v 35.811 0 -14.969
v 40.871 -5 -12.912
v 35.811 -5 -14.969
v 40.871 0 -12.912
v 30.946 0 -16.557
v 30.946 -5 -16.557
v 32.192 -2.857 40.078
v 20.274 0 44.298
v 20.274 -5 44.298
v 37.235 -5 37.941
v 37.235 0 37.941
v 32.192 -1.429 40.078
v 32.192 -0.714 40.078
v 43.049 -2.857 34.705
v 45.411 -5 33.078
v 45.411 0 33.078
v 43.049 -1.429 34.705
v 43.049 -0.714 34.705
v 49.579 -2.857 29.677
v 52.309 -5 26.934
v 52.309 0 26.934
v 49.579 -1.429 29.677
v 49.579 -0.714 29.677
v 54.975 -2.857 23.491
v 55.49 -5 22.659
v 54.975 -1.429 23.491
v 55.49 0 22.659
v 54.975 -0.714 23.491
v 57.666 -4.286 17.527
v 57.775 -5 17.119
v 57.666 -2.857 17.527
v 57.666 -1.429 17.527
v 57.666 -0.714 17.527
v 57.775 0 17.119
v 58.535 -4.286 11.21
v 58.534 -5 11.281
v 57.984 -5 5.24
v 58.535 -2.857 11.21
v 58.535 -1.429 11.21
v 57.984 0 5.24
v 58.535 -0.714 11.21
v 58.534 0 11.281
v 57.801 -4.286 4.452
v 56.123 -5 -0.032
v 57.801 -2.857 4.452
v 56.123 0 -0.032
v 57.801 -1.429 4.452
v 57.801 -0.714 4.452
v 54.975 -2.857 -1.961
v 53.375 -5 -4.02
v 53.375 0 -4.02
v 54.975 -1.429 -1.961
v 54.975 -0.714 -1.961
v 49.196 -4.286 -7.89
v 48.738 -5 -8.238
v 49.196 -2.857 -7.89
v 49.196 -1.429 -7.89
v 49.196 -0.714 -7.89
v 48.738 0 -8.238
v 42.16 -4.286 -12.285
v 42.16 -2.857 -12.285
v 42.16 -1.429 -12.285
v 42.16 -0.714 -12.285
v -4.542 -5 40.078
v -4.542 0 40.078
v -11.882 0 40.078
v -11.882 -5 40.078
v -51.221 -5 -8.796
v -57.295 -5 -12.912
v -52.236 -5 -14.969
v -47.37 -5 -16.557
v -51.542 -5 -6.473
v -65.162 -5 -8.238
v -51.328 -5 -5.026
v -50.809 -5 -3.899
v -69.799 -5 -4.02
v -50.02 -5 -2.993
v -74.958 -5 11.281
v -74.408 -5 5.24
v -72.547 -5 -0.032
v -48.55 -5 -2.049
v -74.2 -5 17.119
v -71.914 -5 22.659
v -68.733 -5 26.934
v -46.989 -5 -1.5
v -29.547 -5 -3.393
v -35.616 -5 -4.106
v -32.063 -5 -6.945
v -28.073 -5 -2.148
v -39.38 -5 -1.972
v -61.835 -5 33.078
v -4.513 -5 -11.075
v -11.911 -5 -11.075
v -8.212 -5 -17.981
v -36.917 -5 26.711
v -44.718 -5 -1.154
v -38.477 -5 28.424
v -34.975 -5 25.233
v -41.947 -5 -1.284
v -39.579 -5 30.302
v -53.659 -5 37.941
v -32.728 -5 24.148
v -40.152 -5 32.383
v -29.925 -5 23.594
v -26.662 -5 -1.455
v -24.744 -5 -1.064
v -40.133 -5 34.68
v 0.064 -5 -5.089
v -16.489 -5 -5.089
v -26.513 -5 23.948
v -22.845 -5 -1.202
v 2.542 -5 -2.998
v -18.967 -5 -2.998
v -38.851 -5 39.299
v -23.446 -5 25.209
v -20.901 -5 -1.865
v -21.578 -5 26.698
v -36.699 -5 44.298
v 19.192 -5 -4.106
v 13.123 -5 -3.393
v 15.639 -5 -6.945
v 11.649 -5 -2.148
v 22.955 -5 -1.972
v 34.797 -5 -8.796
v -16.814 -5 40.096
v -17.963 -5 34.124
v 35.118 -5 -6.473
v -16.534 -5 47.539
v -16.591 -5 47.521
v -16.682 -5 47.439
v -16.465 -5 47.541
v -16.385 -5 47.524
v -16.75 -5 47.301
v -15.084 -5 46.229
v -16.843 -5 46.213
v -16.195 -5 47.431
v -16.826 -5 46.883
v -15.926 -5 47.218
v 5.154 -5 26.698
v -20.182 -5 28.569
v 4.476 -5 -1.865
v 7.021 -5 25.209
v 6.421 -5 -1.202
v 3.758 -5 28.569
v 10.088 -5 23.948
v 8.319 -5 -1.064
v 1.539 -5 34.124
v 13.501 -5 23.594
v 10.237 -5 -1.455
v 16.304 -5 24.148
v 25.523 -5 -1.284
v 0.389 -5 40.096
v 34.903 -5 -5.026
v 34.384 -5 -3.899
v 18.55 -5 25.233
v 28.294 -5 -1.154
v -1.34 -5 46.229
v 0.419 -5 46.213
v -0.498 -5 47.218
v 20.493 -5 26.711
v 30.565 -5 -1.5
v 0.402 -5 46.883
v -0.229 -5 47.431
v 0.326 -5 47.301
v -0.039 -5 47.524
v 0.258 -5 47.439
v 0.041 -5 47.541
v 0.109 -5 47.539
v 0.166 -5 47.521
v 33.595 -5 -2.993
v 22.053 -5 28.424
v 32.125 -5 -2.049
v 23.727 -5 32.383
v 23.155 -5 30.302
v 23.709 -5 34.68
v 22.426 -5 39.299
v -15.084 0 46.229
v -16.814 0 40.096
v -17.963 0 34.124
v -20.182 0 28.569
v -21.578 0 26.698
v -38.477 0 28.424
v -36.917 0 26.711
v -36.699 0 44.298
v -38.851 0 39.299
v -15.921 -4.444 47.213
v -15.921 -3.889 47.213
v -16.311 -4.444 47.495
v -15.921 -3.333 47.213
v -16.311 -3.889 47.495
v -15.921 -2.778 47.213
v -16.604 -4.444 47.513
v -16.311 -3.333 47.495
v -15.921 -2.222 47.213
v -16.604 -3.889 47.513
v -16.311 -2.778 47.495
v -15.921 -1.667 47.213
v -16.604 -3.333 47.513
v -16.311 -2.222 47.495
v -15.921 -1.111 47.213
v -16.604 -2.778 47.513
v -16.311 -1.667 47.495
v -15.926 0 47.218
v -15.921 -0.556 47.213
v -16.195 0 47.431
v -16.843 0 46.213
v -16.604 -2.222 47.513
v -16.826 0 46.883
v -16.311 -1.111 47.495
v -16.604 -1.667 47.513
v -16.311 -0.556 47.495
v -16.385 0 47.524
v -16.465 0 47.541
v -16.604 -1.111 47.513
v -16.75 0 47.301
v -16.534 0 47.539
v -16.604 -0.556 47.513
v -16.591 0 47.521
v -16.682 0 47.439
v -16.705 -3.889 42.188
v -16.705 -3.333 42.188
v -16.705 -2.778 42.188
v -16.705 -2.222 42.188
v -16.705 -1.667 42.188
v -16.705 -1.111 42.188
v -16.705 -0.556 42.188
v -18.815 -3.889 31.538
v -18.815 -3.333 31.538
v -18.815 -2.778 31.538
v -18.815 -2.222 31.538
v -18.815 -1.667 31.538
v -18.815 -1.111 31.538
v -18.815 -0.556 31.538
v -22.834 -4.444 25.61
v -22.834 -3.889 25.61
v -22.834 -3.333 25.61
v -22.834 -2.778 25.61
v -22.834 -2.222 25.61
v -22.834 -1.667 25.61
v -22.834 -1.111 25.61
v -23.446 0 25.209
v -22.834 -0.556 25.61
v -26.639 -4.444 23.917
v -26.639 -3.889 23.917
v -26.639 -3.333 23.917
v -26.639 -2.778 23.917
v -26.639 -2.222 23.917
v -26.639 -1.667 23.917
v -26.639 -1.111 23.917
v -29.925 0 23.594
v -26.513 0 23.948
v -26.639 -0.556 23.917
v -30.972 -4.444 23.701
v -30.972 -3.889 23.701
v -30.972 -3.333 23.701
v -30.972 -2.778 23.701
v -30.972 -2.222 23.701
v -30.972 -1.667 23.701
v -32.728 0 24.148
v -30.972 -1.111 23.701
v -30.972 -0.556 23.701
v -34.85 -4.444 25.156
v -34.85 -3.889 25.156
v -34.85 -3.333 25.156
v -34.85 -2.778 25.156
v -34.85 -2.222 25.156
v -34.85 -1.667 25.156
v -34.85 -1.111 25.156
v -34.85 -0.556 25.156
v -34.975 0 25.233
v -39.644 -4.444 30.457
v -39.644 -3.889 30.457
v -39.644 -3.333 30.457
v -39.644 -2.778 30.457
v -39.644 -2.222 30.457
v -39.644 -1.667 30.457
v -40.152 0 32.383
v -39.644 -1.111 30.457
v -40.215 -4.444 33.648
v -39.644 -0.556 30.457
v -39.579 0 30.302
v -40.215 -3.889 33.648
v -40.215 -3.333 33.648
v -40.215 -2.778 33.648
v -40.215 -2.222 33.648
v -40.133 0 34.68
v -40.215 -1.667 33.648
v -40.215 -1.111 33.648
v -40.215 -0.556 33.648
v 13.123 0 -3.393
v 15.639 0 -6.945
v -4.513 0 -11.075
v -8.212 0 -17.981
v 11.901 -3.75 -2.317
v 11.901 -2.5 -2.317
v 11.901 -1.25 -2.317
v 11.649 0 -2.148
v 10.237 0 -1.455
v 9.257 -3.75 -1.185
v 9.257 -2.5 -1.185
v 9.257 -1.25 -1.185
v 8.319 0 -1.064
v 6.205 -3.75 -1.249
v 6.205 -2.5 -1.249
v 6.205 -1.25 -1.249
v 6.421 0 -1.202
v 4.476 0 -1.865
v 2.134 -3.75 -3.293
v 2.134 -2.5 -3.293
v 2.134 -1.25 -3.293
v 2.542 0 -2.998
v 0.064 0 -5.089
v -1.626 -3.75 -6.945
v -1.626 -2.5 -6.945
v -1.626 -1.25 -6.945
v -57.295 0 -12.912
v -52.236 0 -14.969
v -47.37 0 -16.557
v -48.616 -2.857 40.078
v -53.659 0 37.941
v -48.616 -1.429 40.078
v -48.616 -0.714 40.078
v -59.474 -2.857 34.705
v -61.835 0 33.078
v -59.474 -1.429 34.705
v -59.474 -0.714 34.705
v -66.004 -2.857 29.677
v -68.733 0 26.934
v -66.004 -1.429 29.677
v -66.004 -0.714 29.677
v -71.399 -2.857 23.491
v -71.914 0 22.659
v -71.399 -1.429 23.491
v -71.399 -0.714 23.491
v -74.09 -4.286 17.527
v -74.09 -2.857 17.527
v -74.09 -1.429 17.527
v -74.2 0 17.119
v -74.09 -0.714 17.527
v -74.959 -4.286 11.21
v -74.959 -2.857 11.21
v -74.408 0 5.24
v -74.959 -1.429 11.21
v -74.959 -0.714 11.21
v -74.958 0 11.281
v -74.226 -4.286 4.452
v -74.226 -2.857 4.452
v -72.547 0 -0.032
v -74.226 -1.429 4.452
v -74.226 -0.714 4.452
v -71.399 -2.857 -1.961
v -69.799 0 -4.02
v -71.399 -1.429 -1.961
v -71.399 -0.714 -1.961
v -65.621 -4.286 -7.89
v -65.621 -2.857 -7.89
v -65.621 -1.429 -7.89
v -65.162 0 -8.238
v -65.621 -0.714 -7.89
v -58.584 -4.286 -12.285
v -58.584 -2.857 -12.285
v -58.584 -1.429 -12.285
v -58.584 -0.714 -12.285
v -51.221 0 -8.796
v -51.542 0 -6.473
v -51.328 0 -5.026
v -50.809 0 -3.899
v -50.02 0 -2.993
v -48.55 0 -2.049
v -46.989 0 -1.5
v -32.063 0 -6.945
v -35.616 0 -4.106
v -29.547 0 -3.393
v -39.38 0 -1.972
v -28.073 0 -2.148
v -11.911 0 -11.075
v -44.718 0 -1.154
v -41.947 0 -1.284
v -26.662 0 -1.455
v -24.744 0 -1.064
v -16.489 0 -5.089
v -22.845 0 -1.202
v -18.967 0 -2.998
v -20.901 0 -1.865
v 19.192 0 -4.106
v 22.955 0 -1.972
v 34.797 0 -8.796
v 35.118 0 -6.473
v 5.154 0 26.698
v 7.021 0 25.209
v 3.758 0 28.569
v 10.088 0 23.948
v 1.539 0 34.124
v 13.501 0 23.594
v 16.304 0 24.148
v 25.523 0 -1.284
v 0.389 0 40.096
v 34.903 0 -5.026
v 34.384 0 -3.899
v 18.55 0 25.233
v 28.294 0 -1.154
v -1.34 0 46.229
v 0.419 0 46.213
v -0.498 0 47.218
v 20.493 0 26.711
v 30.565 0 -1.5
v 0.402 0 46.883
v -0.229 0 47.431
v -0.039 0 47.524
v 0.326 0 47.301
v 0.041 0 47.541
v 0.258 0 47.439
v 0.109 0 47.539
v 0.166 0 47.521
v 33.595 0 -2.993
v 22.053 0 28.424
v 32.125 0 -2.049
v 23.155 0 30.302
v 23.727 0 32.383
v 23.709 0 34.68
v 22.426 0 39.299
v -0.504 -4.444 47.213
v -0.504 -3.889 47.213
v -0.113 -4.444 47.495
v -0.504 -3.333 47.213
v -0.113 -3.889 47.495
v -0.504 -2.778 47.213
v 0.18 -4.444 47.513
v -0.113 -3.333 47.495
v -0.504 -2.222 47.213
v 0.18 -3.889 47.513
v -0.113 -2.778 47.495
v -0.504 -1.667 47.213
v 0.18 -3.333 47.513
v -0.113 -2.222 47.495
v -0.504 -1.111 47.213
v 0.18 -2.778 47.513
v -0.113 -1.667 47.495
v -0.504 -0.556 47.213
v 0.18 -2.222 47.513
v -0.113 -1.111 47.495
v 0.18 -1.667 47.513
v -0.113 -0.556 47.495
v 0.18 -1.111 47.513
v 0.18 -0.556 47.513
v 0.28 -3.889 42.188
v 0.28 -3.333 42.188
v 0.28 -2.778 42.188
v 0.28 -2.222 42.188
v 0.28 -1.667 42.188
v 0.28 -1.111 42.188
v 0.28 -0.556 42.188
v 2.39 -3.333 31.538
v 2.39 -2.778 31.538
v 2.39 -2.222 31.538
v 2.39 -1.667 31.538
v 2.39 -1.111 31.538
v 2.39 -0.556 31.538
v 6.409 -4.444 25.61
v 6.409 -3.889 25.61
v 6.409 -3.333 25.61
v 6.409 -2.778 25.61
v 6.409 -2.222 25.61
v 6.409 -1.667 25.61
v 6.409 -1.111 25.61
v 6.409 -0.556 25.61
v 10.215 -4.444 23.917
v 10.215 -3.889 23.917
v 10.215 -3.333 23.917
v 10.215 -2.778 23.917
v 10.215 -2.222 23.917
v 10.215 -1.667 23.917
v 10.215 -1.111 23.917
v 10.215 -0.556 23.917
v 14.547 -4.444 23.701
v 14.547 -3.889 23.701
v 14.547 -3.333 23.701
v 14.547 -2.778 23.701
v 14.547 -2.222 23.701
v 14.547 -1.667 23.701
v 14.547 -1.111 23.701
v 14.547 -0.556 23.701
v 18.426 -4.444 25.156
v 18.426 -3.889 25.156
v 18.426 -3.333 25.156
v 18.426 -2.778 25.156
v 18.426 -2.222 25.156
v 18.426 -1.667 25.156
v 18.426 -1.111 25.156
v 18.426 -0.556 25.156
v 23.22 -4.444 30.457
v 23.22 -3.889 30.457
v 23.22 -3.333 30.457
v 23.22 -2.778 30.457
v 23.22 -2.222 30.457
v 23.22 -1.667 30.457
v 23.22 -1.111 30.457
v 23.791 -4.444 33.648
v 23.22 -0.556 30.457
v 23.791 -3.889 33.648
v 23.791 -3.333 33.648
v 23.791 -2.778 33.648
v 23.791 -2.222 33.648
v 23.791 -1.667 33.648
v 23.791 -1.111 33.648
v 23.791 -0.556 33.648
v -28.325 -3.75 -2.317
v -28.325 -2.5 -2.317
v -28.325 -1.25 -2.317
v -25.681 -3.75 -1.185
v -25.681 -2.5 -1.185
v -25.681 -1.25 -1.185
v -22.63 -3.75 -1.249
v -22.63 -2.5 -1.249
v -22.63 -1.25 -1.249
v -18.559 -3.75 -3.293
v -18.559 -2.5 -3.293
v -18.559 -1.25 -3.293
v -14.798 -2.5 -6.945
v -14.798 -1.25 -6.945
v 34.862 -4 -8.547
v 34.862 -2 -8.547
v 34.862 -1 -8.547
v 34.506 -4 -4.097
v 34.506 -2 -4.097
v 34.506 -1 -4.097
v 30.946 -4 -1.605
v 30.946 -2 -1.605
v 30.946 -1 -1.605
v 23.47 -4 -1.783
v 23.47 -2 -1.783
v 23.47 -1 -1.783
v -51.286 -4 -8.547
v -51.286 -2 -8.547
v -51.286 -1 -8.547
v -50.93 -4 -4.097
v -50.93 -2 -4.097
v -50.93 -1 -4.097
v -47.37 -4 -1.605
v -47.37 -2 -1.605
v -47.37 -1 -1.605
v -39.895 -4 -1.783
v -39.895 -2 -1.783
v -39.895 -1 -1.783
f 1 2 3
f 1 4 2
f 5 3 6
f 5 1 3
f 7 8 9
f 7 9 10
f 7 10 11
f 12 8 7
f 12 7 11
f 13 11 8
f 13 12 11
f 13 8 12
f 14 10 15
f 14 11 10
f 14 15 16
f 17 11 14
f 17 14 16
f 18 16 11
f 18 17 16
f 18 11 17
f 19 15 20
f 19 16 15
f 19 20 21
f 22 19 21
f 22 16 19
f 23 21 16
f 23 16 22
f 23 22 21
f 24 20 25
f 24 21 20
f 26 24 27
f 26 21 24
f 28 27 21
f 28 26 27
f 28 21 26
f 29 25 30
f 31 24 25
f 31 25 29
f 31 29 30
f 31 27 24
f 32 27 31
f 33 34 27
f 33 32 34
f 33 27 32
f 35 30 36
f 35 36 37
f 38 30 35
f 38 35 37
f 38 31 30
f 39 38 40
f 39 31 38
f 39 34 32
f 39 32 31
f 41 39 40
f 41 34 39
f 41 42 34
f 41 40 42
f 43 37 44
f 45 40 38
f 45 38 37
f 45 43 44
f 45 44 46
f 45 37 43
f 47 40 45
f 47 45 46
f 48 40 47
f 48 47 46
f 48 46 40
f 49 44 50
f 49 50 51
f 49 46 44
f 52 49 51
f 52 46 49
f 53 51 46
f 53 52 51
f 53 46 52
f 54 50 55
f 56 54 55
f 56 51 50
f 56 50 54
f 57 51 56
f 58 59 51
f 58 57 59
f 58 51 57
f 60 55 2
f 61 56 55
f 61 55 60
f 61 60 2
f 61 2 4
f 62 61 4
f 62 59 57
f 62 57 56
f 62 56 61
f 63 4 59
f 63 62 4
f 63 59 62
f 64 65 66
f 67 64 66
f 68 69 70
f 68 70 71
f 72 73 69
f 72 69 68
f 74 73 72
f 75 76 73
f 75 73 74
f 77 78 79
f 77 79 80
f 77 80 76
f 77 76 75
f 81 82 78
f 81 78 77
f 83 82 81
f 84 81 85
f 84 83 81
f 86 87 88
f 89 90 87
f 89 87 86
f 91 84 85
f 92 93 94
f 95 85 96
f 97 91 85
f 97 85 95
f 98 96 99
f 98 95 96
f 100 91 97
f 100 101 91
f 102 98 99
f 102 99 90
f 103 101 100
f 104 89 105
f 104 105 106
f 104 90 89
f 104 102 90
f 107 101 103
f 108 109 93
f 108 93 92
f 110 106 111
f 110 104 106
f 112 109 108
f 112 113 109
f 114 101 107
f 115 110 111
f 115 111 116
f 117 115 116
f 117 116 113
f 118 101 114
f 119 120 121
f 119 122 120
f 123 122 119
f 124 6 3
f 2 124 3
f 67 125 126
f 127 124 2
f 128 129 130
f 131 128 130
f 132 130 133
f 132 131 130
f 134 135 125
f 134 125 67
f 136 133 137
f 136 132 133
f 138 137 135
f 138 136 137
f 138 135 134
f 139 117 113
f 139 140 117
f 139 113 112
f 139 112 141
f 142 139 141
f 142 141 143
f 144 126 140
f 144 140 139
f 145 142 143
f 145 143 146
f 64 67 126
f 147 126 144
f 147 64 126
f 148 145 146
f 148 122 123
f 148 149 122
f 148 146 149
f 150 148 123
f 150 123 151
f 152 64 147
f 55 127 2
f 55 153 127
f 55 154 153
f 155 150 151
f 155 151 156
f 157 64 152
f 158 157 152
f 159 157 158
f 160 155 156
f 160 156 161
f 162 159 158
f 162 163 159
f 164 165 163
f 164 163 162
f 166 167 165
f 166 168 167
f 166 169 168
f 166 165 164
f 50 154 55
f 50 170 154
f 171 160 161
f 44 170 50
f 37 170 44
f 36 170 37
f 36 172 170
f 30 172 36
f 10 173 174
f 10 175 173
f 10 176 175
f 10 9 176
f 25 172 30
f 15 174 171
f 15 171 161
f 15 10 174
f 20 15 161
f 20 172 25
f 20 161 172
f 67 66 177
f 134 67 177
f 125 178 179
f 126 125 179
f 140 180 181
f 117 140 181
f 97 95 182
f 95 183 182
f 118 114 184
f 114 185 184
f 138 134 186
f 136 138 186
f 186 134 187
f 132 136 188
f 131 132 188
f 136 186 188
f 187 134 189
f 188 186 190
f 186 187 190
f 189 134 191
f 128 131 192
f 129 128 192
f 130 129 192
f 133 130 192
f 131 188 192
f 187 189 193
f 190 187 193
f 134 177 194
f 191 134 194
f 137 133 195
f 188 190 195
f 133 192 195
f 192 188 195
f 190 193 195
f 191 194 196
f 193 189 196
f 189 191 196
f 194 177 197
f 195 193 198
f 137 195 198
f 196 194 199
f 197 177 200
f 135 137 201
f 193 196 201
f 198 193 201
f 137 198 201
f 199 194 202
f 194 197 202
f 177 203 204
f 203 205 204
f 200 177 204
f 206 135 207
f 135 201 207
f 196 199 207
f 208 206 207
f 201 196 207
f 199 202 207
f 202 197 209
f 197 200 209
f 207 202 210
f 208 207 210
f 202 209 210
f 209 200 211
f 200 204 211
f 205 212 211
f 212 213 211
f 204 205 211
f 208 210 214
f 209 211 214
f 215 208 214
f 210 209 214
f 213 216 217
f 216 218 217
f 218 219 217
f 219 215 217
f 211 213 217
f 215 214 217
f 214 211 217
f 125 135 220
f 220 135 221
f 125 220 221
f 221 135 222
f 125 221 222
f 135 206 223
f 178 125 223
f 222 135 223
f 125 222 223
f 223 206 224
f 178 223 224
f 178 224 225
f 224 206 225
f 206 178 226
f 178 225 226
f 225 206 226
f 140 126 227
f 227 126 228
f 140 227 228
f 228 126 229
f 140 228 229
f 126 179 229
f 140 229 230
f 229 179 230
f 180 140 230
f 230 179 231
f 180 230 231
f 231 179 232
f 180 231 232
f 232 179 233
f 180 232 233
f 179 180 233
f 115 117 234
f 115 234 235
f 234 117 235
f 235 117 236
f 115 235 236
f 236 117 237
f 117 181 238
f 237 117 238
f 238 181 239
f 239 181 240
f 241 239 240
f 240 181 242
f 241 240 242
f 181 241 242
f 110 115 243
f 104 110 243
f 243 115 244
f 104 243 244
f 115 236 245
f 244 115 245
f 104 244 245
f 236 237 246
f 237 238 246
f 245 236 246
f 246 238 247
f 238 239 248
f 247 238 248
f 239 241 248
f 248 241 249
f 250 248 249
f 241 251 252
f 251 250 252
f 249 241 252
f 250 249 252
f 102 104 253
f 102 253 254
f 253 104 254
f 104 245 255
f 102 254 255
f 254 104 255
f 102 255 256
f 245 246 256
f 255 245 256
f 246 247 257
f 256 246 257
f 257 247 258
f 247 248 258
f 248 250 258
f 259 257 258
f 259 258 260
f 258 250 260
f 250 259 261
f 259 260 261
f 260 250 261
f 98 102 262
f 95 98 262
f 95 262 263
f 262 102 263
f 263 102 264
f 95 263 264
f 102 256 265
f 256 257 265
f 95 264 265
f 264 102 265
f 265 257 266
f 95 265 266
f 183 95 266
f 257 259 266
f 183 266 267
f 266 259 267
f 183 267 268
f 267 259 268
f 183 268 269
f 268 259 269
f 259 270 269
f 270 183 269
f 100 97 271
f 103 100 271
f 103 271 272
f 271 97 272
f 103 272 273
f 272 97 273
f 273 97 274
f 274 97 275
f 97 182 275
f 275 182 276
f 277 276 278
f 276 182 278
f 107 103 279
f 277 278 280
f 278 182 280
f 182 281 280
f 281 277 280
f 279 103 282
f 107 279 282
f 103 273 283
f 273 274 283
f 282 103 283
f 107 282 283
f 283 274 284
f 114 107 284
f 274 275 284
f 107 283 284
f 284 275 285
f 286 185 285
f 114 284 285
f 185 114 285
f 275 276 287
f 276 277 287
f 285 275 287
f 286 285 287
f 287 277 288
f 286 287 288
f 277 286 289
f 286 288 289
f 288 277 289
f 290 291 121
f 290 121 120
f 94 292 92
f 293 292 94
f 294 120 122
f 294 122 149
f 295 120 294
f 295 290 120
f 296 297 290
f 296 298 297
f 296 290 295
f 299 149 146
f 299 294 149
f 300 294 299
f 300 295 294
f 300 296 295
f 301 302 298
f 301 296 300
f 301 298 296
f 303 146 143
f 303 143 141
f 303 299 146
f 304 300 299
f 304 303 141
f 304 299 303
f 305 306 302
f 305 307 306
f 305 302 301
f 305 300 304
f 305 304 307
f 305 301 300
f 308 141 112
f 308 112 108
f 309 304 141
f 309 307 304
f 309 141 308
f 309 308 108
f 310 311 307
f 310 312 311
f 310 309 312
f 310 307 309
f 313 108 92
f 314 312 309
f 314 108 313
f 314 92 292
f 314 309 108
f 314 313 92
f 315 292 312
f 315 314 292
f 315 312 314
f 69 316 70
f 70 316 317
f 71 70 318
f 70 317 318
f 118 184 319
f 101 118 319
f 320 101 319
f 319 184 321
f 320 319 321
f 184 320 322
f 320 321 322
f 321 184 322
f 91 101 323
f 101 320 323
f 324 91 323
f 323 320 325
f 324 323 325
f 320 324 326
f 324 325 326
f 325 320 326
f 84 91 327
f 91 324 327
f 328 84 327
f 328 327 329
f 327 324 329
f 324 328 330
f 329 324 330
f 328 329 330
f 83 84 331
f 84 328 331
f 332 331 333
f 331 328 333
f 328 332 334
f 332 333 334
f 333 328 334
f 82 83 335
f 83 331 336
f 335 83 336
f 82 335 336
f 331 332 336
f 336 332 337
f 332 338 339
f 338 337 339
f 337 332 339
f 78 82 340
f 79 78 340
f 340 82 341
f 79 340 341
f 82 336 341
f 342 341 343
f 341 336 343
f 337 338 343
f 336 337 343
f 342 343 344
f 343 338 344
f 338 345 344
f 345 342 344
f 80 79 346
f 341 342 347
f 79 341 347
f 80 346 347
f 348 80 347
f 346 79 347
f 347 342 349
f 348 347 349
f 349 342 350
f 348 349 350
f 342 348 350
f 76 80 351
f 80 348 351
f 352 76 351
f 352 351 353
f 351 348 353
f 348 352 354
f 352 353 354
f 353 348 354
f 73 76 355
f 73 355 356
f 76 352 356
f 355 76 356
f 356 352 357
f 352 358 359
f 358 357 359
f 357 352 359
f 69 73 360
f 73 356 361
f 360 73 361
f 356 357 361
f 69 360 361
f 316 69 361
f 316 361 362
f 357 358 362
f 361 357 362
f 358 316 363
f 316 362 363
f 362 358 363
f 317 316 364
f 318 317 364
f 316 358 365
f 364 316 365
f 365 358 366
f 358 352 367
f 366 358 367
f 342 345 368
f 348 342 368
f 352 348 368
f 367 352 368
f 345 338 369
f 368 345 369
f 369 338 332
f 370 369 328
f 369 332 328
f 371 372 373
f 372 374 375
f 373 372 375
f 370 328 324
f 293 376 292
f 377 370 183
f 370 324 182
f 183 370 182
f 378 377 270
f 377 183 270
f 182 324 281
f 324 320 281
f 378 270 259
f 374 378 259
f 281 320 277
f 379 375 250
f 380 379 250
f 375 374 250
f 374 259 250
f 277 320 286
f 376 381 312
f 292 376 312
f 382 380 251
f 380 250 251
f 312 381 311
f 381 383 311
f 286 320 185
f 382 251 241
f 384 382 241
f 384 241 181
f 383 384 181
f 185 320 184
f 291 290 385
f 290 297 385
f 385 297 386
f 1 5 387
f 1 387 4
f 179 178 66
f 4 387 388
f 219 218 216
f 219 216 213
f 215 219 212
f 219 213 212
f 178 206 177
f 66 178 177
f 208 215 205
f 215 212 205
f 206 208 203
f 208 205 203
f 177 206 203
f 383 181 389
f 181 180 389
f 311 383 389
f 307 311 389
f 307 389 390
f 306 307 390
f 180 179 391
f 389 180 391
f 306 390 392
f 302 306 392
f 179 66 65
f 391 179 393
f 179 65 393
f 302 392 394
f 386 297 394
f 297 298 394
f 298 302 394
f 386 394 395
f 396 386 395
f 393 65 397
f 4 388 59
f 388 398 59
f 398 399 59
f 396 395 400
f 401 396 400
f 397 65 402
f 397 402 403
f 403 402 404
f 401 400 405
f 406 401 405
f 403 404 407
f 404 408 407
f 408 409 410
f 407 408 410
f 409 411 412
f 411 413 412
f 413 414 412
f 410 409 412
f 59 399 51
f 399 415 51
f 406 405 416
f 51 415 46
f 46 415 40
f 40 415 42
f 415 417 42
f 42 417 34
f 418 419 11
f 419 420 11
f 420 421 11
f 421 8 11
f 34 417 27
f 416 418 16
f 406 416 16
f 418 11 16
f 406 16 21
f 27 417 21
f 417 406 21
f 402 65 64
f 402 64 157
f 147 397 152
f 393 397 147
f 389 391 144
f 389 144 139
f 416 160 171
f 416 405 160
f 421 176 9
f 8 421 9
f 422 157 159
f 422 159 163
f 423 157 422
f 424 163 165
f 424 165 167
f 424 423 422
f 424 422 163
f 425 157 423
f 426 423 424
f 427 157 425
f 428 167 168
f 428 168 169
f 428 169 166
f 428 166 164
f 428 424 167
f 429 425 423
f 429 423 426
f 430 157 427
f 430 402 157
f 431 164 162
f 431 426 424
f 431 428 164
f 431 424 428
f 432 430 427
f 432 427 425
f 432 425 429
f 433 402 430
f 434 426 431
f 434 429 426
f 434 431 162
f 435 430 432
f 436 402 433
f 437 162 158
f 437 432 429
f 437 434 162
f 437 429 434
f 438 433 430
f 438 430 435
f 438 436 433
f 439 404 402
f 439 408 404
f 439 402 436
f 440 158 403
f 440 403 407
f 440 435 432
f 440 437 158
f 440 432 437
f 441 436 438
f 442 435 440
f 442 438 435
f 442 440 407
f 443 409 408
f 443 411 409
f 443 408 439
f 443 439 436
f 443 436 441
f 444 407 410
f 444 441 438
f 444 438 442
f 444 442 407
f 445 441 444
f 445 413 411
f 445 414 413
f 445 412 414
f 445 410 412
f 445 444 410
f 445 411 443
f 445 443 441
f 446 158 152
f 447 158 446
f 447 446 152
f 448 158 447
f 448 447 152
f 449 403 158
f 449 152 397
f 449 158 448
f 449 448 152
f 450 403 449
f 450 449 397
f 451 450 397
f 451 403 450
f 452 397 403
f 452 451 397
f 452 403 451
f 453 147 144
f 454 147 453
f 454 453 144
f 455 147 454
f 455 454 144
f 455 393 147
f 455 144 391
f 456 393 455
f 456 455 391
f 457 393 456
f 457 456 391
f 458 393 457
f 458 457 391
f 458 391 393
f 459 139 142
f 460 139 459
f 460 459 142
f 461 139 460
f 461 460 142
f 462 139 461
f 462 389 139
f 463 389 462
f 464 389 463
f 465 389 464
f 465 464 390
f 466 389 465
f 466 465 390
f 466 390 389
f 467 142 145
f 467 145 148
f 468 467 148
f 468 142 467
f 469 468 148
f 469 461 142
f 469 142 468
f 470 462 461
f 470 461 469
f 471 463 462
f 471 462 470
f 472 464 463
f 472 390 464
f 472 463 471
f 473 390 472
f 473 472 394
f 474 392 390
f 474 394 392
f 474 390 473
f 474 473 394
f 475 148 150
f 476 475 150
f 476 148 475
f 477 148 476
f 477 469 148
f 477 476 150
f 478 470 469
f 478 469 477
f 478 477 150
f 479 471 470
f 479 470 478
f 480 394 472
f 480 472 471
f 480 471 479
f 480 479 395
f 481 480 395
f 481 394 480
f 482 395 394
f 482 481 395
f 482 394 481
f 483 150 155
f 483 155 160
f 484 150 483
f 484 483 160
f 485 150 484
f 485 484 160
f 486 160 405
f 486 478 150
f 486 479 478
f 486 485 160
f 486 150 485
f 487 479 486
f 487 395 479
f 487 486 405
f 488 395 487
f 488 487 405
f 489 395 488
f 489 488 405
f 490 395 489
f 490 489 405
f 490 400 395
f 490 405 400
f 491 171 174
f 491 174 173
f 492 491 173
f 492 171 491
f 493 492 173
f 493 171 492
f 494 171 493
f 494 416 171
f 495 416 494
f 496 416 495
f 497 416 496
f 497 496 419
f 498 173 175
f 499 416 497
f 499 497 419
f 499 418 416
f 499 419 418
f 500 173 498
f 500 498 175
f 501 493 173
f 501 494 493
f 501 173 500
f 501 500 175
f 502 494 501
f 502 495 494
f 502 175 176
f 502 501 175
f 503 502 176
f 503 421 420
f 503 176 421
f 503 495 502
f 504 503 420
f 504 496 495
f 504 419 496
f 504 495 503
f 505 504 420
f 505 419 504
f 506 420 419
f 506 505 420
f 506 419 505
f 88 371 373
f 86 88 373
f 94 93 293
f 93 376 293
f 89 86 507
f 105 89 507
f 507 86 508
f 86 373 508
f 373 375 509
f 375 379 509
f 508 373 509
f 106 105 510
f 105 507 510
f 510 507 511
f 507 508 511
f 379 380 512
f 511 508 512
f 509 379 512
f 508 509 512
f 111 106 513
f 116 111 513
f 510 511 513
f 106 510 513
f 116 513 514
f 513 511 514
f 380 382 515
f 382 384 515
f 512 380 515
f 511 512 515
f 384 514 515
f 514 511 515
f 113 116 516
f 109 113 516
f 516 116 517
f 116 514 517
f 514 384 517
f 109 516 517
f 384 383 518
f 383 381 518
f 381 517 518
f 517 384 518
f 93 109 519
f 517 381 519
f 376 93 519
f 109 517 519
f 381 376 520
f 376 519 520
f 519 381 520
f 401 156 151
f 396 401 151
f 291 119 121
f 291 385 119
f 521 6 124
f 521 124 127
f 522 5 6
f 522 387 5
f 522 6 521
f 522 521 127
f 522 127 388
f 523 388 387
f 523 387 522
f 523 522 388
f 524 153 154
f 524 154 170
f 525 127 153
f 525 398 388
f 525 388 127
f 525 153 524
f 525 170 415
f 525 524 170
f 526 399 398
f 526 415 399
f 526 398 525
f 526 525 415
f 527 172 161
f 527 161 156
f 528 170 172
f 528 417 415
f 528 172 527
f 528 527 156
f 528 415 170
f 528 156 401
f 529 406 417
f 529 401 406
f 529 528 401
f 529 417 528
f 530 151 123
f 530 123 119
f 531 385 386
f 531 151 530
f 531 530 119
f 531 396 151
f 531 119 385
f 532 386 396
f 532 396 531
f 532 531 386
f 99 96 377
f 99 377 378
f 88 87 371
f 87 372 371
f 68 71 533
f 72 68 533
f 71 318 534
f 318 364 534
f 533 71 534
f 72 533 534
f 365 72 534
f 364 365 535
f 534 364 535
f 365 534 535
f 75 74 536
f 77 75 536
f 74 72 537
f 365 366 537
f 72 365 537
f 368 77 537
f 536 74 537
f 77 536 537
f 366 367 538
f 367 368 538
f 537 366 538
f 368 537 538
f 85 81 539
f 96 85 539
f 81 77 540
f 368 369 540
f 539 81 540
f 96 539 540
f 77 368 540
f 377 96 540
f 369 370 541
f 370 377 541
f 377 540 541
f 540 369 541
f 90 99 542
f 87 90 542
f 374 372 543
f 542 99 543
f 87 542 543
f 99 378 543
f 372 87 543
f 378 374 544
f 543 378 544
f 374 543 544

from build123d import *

# Parameters (mm, degrees)
F1_DEPTH = 5


with BuildPart() as f1:
    # F0 (on Front) → F1 (new body)
    with BuildSketch(Plane.XZ):
        with BuildLine():
            Line((-8.2122022286, 40.0784350932), (-11.8819409981, 40.0784350932))
            add(Edge.make_bspline(
                [(-11.8819409981, 40.0784350932), (-12.8782472371, 42.2972484802), (-14.4335544357, 45.7609791067), (-17.3519257227, 48.7913666131), (-16.0950854738, 41.2351091341), (-18.4014485043, 31.4854467346), (-22.0437905993, 24.85808478), (-31.2282103596, 22.4385748293), (-38.4247454255, 27.2876434832), (-41.4317275403, 33.8661623662), (-38.41791048, 40.5091837611), (-36.6988517344, 44.2983135581)],
                knots=[0, 0, 0, 0, 0.1088146702, 0.1698676905, 0.2662726076, 0.4039159487, 0.5157076846, 0.6364836069, 0.7547343235, 0.8601022896, 1, 1, 1, 1], degree=3))
            add(Edge.make_bspline(
                [(-36.6988517344, 44.2983135581), (-40.7675535004, 42.9207700785), (-48.8190673042, 40.1947628707), (-59.720474171, 35.363141512), (-72.7769239422, 24.2824619419), (-75.9139064544, 11.2929836241), (-73.1167440149, -3.1146307179), (-58.8360799137, -12.9740366543), (-50.9861442753, -15.4269461348), (-47.3704449832, -16.5567621589)],
                knots=[0, 0, 0, 0, 0.1374294184, 0.271957721, 0.4283369128, 0.5665488064, 0.709317309, 0.8661108513, 1, 1, 1, 1], degree=3))
            add(Edge.make_bspline(
                [(-47.3704449832, -16.5567621589), (-49.0258540698, -13.767318885), (-51.8526301052, -9.0040664284), (-51.5200005236, -3.7669274307), (-47.3638537079, -1.00085823), (-39.2892684136, -0.8731954731), (-34.5610362718, -4.8462458488), (-32.0631302893, -6.9451923482)],
                knots=[0, 0, 0, 0, 0.2300305605, 0.3928001127, 0.553391391, 0.764058472, 1, 1, 1, 1], degree=3))
            add(Edge.make_bspline(
                [(-32.0631302893, -6.9451923482), (-30.9825657831, -5.1874304781), (-28.8354937584, -1.6947733382), (-22.0931432409, -0.1443481526), (-13.8550388164, -6.7624223585), (-10.1796756768, -14.0692507531), (-8.2122022286, -17.9806984961)],
                knots=[0, 0, 0, 0, 0.2112971318, 0.419845514, 0.689435165, 1, 1, 1, 1], degree=3))
            add(Edge.make_bspline(
                [(15.6387258321, -6.9451923482), (14.5581613259, -5.1874304781), (12.4110893012, -1.6947733382), (5.6687387837, -0.1443481526), (-2.5693656408, -6.7624223585), (-6.2447287804, -14.0692507531), (-8.2122022286, -17.9806984961)],
                knots=[0, 0, 0, 0, 0.2112971318, 0.419845514, 0.689435165, 1, 1, 1, 1], degree=3))
            add(Edge.make_bspline(
                [(30.946040526, -16.5567621589), (32.6014496126, -13.767318885), (35.428225648, -9.0040664284), (35.0955960664, -3.7669274307), (30.9394492507, -1.00085823), (22.8648639564, -0.8731954731), (18.1366318146, -4.8462458488), (15.6387258321, -6.9451923482)],
                knots=[0, 0, 0, 0, 0.2300305605, 0.3928001127, 0.553391391, 0.764058472, 1, 1, 1, 1], degree=3))
            add(Edge.make_bspline(
                [(20.2744472772, 44.2983135581), (24.3431490432, 42.9207700785), (32.394662847, 40.1947628707), (43.2960697138, 35.363141512), (56.352519485, 24.2824619419), (59.4895019971, 11.2929836241), (56.6923395577, -3.1146307179), (42.4116754565, -12.9740366543), (34.5617398181, -15.4269461348), (30.946040526, -16.5567621589)],
                knots=[0, 0, 0, 0, 0.1374294184, 0.271957721, 0.4283369128, 0.5665488064, 0.709317309, 0.8661108513, 1, 1, 1, 1], degree=3))
            add(Edge.make_bspline(
                [(-4.5424634591, 40.0784350932), (-3.5461572201, 42.2972484802), (-1.9908500215, 45.7609791067), (0.9275212655, 48.7913666131), (-0.3293189834, 41.2351091341), (1.9770440471, 31.4854467346), (5.6193861421, 24.85808478), (14.8038059024, 22.4385748293), (22.0003409683, 27.2876434832), (25.0073230831, 33.8661623662), (21.9935060227, 40.5091837611), (20.2744472772, 44.2983135581)],
                knots=[0, 0, 0, 0, 0.1088146702, 0.1698676905, 0.2662726076, 0.4039159487, 0.5157076846, 0.6364836069, 0.7547343235, 0.8601022896, 1, 1, 1, 1], degree=3))
            Line((-4.5424634591, 40.0784350932), (-8.2122022286, 40.0784350932))
        make_face()
        with BuildLine():
            add(Edge.make_bspline(
                [(-40.7788082957, 40.8485867083), (-45.0160925485, 39.1557450069), (-53.0935510599, 35.9287114181), (-62.2941692207, 30.6878977022), (-71.2479782326, 20.5851416615), (-73.0395933906, 13.1368363398), (-70.655821628, 0.3918412405), (-65.9333309108, -4.7486149953), (-56.4205247664, -11.0687593178), (-52.9760592159, -12.4550883248), (-51.5802241862, -13.0168842152)],
                knots=[0, 0, 0, 0, 0.1450786062, 0.2765607292, 0.4190573419, 0.5300860887, 0.6687412322, 0.7763945775, 0.9093861509, 1, 1, 1, 1], degree=3))
            add(Edge.make_bspline(
                [(-12.7671184018, 37.1527262032), (-12.8105221655, 37.767832184), (-12.9167695581, 39.2735404689), (-14.2569275875, 43.199559326), (-15.3833842453, 44.8124103405), (-15.4205368039, 43.5883704744), (-15.2325001114, 42.0644743626), (-15.5858480298, 37.7221519204), (-16.6233242245, 33.2855966544), (-18.8663482525, 24.8126850649), (-23.665219481, 22.8462807986), (-32.7768476073, 20.7730831752), (-39.0865075301, 23.8717377388), (-43.0417250552, 31.6481993654), (-41.5266216034, 37.7005347177), (-40.999533454, 39.9194052312), (-40.7788082957, 40.8485867083)],
                knots=[0, 0, 0, 0, 0.0505373663, 0.1237096266, 0.1629392742, 0.1913954138, 0.2358051509, 0.3063180282, 0.384250961, 0.4831926503, 0.5605011807, 0.6644710974, 0.7540445736, 0.853320775, 0.9385761278, 1, 1, 1, 1], degree=3))
            add(Edge.make_bspline(
                [(-3.9949859492, 37.1527262032), (-6.9190301001, 37.1527262032), (-9.843074251, 37.1527262032), (-12.7671184018, 37.1527262032)],
                knots=[0, 0, 0, 0, 8.7721324526, 8.7721324526, 8.7721324526, 8.7721324526], degree=3))
            add(Edge.make_bspline(
                [(23.7335767597, 41.2493087351), (24.4530114667, 39.9054678233), (26.0244092307, 36.9702346694), (26.4309050247, 30.0518223198), (21.4354728883, 23.0866334692), (16.0479597422, 20.9866016223), (7.9404867152, 21.5334795427), (2.0840254692, 24.9926080902), (-1.1094411846, 32.1097669255), (-2.0201724202, 39.2006909165), (-0.2992768192, 43.7223415812), (-0.8622936336, 45.0976152318), (-1.5127566292, 43.0204295249), (-2.6220619028, 39.8039584717), (-3.553918632, 38.0044644382), (-3.9949859492, 37.1527262032)],
                knots=[0, 0, 0, 0, 0.0759707125, 0.1659361253, 0.2650579009, 0.3479302006, 0.4454920972, 0.5347423734, 0.6305967349, 0.7255041462, 0.8006387765, 0.8294813208, 0.8722005151, 0.9395098257, 1, 1, 1, 1], degree=3))
            add(Edge.make_bspline(
                [(33.6919203401, -14.0843614936), (36.1215948245, -13.1765941813), (40.9033469103, -11.3900510592), (46.9128093998, -7.3858234932), (52.3922477573, -1.9336381195), (55.6792503222, 4.8090224621), (57.3430496625, 14.3121441122), (51.6156153831, 23.3802559022), (46.1096093701, 29.991862224), (34.2840988264, 35.6082745296), (26.8791146652, 39.6051952856), (24.6061054028, 40.7932544385), (23.7335767597, 41.2493087351)],
                knots=[0, 0, 0, 0, 0.0974700928, 0.1918272684, 0.2883916571, 0.3843656764, 0.4907723409, 0.6027746209, 0.7066328683, 0.8340968769, 0.9363156018, 1, 1, 1, 1], degree=3))
            add(Edge.make_bspline(
                [(15.9203130752, -4.4681387953), (17.0357728529, -3.6507396117), (19.5409740796, -1.8149500311), (25.6074769381, 1.673208692), (34.2650515573, 0.1921565778), (38.1250522154, -4.8981844373), (36.9121199249, -10.7908754792), (34.7328056008, -13.0197874016), (33.6919203401, -14.0843614936)],
                knots=[0, 0, 0, 0, 0.1453813722, 0.326510735, 0.5253570285, 0.690702799, 0.8522733072, 1, 1, 1, 1], degree=3))
            add(Edge.make_bspline(
                [(-8.41199141, -15.5372489244), (-7.9095024587, -14.4044748883), (-6.7842766221, -11.8678487411), (-3.7155099659, -6.8588281055), (2.1506322805, -0.0343969426), (8.8089995272, 1.9097644372), (13.6745986257, -0.6725949147), (15.1891981707, -3.2324613465), (15.9203130752, -4.4681387953)],
                knots=[0, 0, 0, 0, 0.1379016266, 0.3088037514, 0.5193421259, 0.6974684541, 0.8539644865, 1, 1, 1, 1], degree=3))
            add(Edge.make_bspline(
                [(-32.7044092119, -4.2089852504), (-31.9543092274, -3.1033377243), (-30.4169220227, -0.8372286791), (-26.6621159645, 2.0828916938), (-19.6879348045, 1.1486292117), (-15.0907003626, -2.8975346703), (-9.8445203676, -10.136611032), (-8.8510687142, -13.8819263464), (-8.41199141, -15.5372489244)],
                knots=[0, 0, 0, 0, 0.1390073425, 0.2849061646, 0.4596494045, 0.6323584219, 0.8375129051, 1, 1, 1, 1], degree=3))
            add(Edge.make_bspline(
                [(-51.5802241862, -13.0168842152), (-51.9566141102, -12.1811170797), (-52.8301859904, -10.241366249), (-54.4122635369, -4.5818082654), (-49.7189754854, -0.077195565), (-43.6358806444, 1.8644629269), (-36.5506154261, -0.1909494177), (-33.9335443794, -2.9249383556), (-32.7044092119, -4.2089852504)],
                knots=[0, 0, 0, 0, 0.1250182086, 0.2901575853, 0.4628741696, 0.6427974632, 0.832236041, 1, 1, 1, 1], degree=3))
        make_face(mode=Mode.SUBTRACT)
        with BuildLine():
            add(Edge.make_bspline(
                [(-12.7671184018, 37.1527262032), (-12.8105221655, 37.767832184), (-12.9167695581, 39.2735404689), (-14.2569275875, 43.199559326), (-15.3833842453, 44.8124103405), (-15.4205368039, 43.5883704744), (-15.2325001114, 42.0644743626), (-15.5858480298, 37.7221519204), (-16.6233242245, 33.2855966544), (-18.8663482525, 24.8126850649), (-23.665219481, 22.8462807986), (-32.7768476073, 20.7730831752), (-39.0865075301, 23.8717377388), (-43.0417250552, 31.6481993654), (-41.5266216034, 37.7005347177), (-40.999533454, 39.9194052312), (-40.7788082957, 40.8485867083)],
                knots=[0, 0, 0, 0, 0.0505373663, 0.1237096266, 0.1629392742, 0.1913954138, 0.2358051509, 0.3063180282, 0.384250961, 0.4831926503, 0.5605011807, 0.6644710974, 0.7540445736, 0.853320775, 0.9385761278, 1, 1, 1, 1], degree=3))
            add(Edge.make_bspline(
                [(-40.7788082957, 40.8485867083), (-45.0160925485, 39.1557450069), (-53.0935510599, 35.9287114181), (-62.2941692207, 30.6878977022), (-71.2479782326, 20.5851416615), (-73.0395933906, 13.1368363398), (-70.655821628, 0.3918412405), (-65.9333309108, -4.7486149953), (-56.4205247664, -11.0687593178), (-52.9760592159, -12.4550883248), (-51.5802241862, -13.0168842152)],
                knots=[0, 0, 0, 0, 0.1450786062, 0.2765607292, 0.4190573419, 0.5300860887, 0.6687412322, 0.7763945775, 0.9093861509, 1, 1, 1, 1], degree=3))
            add(Edge.make_bspline(
                [(-51.5802241862, -13.0168842152), (-51.9566141102, -12.1811170797), (-52.8301859904, -10.241366249), (-54.4122635369, -4.5818082654), (-49.7189754854, -0.077195565), (-43.6358806444, 1.8644629269), (-36.5506154261, -0.1909494177), (-33.9335443794, -2.9249383556), (-32.7044092119, -4.2089852504)],
                knots=[0, 0, 0, 0, 0.1250182086, 0.2901575853, 0.4628741696, 0.6427974632, 0.832236041, 1, 1, 1, 1], degree=3))
            add(Edge.make_bspline(
                [(-32.7044092119, -4.2089852504), (-31.9543092274, -3.1033377243), (-30.4169220227, -0.8372286791), (-26.6621159645, 2.0828916938), (-19.6879348045, 1.1486292117), (-15.0907003626, -2.8975346703), (-9.8445203676, -10.136611032), (-8.8510687142, -13.8819263464), (-8.41199141, -15.5372489244)],
                knots=[0, 0, 0, 0, 0.1390073425, 0.2849061646, 0.4596494045, 0.6323584219, 0.8375129051, 1, 1, 1, 1], degree=3))
            add(Edge.make_bspline(
                [(-8.41199141, -15.5372489244), (-7.9095024587, -14.4044748883), (-6.7842766221, -11.8678487411), (-3.7155099659, -6.8588281055), (2.1506322805, -0.0343969426), (8.8089995272, 1.9097644372), (13.6745986257, -0.6725949147), (15.1891981707, -3.2324613465), (15.9203130752, -4.4681387953)],
                knots=[0, 0, 0, 0, 0.1379016266, 0.3088037514, 0.5193421259, 0.6974684541, 0.8539644865, 1, 1, 1, 1], degree=3))
            add(Edge.make_bspline(
                [(15.9203130752, -4.4681387953), (17.0357728529, -3.6507396117), (19.5409740796, -1.8149500311), (25.6074769381, 1.673208692), (34.2650515573, 0.1921565778), (38.1250522154, -4.8981844373), (36.9121199249, -10.7908754792), (34.7328056008, -13.0197874016), (33.6919203401, -14.0843614936)],
                knots=[0, 0, 0, 0, 0.1453813722, 0.326510735, 0.5253570285, 0.690702799, 0.8522733072, 1, 1, 1, 1], degree=3))
            add(Edge.make_bspline(
                [(33.6919203401, -14.0843614936), (36.1215948245, -13.1765941813), (40.9033469103, -11.3900510592), (46.9128093998, -7.3858234932), (52.3922477573, -1.9336381195), (55.6792503222, 4.8090224621), (57.3430496625, 14.3121441122), (51.6156153831, 23.3802559022), (46.1096093701, 29.991862224), (34.2840988264, 35.6082745296), (26.8791146652, 39.6051952856), (24.6061054028, 40.7932544385), (23.7335767597, 41.2493087351)],
                knots=[0, 0, 0, 0, 0.0974700928, 0.1918272684, 0.2883916571, 0.3843656764, 0.4907723409, 0.6027746209, 0.7066328683, 0.8340968769, 0.9363156018, 1, 1, 1, 1], degree=3))
            add(Edge.make_bspline(
                [(23.7335767597, 41.2493087351), (24.4530114667, 39.9054678233), (26.0244092307, 36.9702346694), (26.4309050247, 30.0518223198), (21.4354728883, 23.0866334692), (16.0479597422, 20.9866016223), (7.9404867152, 21.5334795427), (2.0840254692, 24.9926080902), (-1.1094411846, 32.1097669255), (-2.0201724202, 39.2006909165), (-0.2992768192, 43.7223415812), (-0.8622936336, 45.0976152318), (-1.5127566292, 43.0204295249), (-2.6220619028, 39.8039584717), (-3.553918632, 38.0044644382), (-3.9949859492, 37.1527262032)],
                knots=[0, 0, 0, 0, 0.0759707125, 0.1659361253, 0.2650579009, 0.3479302006, 0.4454920972, 0.5347423734, 0.6305967349, 0.7255041462, 0.8006387765, 0.8294813208, 0.8722005151, 0.9395098257, 1, 1, 1, 1], degree=3))
            add(Edge.make_bspline(
                [(-3.9949859492, 37.1527262032), (-6.9190301001, 37.1527262032), (-9.843074251, 37.1527262032), (-12.7671184018, 37.1527262032)],
                knots=[0, 0, 0, 0, 8.7721324526, 8.7721324526, 8.7721324526, 8.7721324526], degree=3))
        make_face()
    extrude(amount=F1_DEPTH)


solid = f1.part
